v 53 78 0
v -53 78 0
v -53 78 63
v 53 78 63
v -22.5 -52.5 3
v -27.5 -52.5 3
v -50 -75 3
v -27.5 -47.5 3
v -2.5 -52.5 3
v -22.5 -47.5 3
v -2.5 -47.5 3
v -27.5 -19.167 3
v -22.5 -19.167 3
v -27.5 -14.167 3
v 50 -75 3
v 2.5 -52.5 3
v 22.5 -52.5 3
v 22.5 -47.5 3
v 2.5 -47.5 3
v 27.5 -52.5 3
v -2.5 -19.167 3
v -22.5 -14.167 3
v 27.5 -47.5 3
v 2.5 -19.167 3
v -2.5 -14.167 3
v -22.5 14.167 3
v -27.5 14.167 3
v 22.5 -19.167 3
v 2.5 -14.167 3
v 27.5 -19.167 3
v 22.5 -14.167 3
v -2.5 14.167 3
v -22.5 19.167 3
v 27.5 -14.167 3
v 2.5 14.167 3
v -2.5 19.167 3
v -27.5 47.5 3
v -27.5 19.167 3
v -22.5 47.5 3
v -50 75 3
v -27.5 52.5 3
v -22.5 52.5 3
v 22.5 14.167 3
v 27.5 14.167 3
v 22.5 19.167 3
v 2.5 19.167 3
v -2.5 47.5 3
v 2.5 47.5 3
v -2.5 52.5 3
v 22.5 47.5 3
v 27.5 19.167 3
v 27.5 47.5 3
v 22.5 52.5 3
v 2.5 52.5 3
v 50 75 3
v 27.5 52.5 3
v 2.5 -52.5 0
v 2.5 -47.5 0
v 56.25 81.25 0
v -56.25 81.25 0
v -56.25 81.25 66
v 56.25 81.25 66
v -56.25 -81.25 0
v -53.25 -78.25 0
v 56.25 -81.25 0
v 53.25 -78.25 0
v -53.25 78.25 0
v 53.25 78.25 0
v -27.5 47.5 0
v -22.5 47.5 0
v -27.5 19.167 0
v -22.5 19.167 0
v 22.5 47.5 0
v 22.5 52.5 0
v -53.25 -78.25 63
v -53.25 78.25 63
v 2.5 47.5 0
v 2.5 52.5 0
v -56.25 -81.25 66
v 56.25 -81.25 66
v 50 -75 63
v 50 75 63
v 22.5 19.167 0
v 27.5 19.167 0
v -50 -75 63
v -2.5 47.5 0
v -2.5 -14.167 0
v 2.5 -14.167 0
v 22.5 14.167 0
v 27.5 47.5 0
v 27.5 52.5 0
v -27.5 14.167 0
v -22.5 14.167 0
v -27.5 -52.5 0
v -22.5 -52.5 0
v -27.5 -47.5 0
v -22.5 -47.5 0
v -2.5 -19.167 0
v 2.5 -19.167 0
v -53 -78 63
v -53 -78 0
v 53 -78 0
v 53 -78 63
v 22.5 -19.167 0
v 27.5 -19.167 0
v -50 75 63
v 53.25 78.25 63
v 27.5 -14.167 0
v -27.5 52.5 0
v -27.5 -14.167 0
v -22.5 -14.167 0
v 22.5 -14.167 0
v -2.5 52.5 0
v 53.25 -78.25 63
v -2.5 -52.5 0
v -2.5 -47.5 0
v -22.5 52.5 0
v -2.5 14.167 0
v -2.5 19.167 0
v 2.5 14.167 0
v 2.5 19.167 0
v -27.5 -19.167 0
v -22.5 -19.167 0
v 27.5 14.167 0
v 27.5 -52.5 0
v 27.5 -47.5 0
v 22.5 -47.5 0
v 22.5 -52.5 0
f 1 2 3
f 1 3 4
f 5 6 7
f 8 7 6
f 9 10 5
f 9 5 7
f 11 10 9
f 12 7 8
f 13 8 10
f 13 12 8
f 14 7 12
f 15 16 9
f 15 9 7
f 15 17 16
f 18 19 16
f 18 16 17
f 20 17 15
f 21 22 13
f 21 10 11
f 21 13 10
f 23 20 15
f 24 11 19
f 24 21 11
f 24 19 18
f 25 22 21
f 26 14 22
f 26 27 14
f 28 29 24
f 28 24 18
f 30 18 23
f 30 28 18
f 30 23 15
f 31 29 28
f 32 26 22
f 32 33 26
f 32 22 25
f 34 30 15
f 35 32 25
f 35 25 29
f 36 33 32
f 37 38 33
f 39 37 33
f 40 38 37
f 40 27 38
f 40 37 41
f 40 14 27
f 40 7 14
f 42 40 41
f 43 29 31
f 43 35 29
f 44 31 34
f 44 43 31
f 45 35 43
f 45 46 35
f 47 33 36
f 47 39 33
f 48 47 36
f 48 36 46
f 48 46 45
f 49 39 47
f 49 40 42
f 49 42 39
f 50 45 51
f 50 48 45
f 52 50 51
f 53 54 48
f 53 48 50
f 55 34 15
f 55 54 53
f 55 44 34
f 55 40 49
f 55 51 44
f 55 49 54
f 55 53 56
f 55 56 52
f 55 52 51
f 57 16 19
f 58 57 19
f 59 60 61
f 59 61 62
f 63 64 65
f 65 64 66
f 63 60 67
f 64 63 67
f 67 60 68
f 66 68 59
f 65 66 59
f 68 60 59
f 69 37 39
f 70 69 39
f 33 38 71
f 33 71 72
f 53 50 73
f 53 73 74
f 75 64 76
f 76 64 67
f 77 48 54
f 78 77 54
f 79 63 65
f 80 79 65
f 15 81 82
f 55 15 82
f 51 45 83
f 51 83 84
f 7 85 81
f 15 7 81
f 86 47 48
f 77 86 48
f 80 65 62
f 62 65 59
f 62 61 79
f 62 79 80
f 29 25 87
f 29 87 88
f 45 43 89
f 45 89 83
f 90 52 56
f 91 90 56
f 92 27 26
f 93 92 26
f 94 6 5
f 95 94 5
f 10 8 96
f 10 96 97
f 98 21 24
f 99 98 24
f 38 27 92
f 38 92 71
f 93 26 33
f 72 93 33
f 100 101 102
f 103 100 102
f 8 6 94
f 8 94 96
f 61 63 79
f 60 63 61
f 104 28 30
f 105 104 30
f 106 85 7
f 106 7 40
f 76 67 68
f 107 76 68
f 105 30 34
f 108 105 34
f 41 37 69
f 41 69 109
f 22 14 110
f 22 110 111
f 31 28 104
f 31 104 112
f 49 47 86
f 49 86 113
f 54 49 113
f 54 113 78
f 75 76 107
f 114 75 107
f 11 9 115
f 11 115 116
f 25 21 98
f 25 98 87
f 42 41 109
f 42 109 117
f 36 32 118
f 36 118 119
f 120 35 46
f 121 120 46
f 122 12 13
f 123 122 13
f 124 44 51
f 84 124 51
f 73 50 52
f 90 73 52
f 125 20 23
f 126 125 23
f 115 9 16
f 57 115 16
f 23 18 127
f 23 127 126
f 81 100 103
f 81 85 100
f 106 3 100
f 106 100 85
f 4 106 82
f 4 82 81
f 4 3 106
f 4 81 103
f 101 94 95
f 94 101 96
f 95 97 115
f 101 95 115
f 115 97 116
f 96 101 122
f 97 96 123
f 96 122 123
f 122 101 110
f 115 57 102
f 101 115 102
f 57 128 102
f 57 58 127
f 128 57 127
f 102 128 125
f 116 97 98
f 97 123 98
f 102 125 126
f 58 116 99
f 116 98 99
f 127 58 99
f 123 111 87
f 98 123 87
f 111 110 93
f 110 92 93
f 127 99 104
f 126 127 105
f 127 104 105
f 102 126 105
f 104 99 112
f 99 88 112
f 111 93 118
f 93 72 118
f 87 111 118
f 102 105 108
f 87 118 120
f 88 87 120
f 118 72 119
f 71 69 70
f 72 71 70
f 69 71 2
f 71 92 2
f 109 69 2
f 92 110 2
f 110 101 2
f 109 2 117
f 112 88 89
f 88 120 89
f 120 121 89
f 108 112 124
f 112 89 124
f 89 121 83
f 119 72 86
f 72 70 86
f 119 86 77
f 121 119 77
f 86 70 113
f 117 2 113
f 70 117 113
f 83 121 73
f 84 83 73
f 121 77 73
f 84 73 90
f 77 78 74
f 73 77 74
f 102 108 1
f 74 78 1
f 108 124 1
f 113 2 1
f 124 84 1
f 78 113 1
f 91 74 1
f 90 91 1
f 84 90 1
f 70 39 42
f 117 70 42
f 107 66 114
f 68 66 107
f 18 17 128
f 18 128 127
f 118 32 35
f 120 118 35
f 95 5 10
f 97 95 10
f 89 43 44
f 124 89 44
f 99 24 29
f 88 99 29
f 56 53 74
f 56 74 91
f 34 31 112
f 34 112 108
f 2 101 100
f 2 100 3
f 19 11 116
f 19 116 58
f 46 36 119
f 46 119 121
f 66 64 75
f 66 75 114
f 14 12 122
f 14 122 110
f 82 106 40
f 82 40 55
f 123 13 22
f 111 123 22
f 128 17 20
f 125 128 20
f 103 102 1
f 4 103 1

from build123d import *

# Parameters (mm, degrees)
SKETCH_W                        = 106
SKETCH_H                        = 156
PAD_DEPTH                       = 63
SKETCH001_W                     = 100
SKETCH001_H                     = 150
POCKET_DEPTH                    = 60
SKETCH004_W                     = 5
SKETCH004_H                     = 5
POCKET002_DEPTH                 = 400.699378
SKETCH004_LINEARPATTERN_2_W     = 5
SKETCH004_LINEARPATTERN_2_H     = 5
POCKET002_LINEARPATTERN_2_DEPTH = 400.699378
SKETCH004_LINEARPATTERN_3_W     = 5
SKETCH004_LINEARPATTERN_3_H     = 5
POCKET002_LINEARPATTERN_3_DEPTH = 400.699378
LINEARPATTERN001_COUNT          = 4
LINEARPATTERN001_PITCH          = 33.333333
SKETCH002_W                     = 112.5
SKETCH002_H                     = 162.5
PAD001_DEPTH                    = 66
SKETCH003_W                     = 106.5
SKETCH003_H                     = 156.5
POCKET001_DEPTH                 = 63


with BuildPart() as bottom_body:
    # Sketch → Pad (new body)
    with BuildSketch(Plane.XY):
        Rectangle(SKETCH_W, SKETCH_H)
    extrude(amount=PAD_DEPTH)

    # Sketch001 (on DatumPlane) → Pocket (cut)
    with BuildSketch(Plane.XY.offset(63)):
        Rectangle(SKETCH001_W, SKETCH001_H)
    extrude(amount=-POCKET_DEPTH, mode=Mode.SUBTRACT)

    # Sketch004 (on Face11 of Pocket) → Pocket002 (cut, through all)
    with BuildSketch(Plane.XY.offset(3)):
        with Locations((-25, 50)):
            Rectangle(SKETCH004_W, SKETCH004_H)
    pocket002 = extrude(amount=-POCKET002_DEPTH, mode=Mode.SUBTRACT)

    # Sketch004 LinearPattern 2 → Pocket002 LinearPattern 2 (cut, through all)
    with BuildSketch(Plane(origin=(25, 0, 3), x_dir=(1, 0, 0), z_dir=(0, 0, 1))):
        with Locations((-25, 50)):
            Rectangle(SKETCH004_LINEARPATTERN_2_W, SKETCH004_LINEARPATTERN_2_H)
    pocket002_linearpattern_2 = extrude(amount=-POCKET002_LINEARPATTERN_2_DEPTH, mode=Mode.SUBTRACT)

    # Sketch004 LinearPattern 3 → Pocket002 LinearPattern 3 (cut, through all)
    with BuildSketch(Plane(origin=(50, 0, 3), x_dir=(1, 0, 0), z_dir=(0, 0, 1))):
        with Locations((-25, 50)):
            Rectangle(SKETCH004_LINEARPATTERN_3_W, SKETCH004_LINEARPATTERN_3_H)
    pocket002_linearpattern_3 = extrude(amount=-POCKET002_LINEARPATTERN_3_DEPTH, mode=Mode.SUBTRACT)

    # LinearPattern001: Pocket002, Pocket002 LinearPattern 2, Pocket002 LinearPattern 3 ×4
    with Locations(*[(0, -i * LINEARPATTERN001_PITCH, 0) for i in range(1, LINEARPATTERN001_COUNT)]):
        add(pocket002, mode=Mode.SUBTRACT)
        add(pocket002_linearpattern_2, mode=Mode.SUBTRACT)
        add(pocket002_linearpattern_3, mode=Mode.SUBTRACT)


with BuildPart() as cover_body:
    # Sketch002 → Pad001 (new body)
    with BuildSketch(Plane.XY):
        Rectangle(SKETCH002_W, SKETCH002_H)
    extrude(amount=PAD001_DEPTH)

    # Sketch003 → Pocket001 (cut)
    with BuildSketch(Plane.XY):
        Rectangle(SKETCH003_W, SKETCH003_H)
    extrude(amount=POCKET001_DEPTH, mode=Mode.SUBTRACT)


solid = Compound([bottom_body.part, cover_body.part])
